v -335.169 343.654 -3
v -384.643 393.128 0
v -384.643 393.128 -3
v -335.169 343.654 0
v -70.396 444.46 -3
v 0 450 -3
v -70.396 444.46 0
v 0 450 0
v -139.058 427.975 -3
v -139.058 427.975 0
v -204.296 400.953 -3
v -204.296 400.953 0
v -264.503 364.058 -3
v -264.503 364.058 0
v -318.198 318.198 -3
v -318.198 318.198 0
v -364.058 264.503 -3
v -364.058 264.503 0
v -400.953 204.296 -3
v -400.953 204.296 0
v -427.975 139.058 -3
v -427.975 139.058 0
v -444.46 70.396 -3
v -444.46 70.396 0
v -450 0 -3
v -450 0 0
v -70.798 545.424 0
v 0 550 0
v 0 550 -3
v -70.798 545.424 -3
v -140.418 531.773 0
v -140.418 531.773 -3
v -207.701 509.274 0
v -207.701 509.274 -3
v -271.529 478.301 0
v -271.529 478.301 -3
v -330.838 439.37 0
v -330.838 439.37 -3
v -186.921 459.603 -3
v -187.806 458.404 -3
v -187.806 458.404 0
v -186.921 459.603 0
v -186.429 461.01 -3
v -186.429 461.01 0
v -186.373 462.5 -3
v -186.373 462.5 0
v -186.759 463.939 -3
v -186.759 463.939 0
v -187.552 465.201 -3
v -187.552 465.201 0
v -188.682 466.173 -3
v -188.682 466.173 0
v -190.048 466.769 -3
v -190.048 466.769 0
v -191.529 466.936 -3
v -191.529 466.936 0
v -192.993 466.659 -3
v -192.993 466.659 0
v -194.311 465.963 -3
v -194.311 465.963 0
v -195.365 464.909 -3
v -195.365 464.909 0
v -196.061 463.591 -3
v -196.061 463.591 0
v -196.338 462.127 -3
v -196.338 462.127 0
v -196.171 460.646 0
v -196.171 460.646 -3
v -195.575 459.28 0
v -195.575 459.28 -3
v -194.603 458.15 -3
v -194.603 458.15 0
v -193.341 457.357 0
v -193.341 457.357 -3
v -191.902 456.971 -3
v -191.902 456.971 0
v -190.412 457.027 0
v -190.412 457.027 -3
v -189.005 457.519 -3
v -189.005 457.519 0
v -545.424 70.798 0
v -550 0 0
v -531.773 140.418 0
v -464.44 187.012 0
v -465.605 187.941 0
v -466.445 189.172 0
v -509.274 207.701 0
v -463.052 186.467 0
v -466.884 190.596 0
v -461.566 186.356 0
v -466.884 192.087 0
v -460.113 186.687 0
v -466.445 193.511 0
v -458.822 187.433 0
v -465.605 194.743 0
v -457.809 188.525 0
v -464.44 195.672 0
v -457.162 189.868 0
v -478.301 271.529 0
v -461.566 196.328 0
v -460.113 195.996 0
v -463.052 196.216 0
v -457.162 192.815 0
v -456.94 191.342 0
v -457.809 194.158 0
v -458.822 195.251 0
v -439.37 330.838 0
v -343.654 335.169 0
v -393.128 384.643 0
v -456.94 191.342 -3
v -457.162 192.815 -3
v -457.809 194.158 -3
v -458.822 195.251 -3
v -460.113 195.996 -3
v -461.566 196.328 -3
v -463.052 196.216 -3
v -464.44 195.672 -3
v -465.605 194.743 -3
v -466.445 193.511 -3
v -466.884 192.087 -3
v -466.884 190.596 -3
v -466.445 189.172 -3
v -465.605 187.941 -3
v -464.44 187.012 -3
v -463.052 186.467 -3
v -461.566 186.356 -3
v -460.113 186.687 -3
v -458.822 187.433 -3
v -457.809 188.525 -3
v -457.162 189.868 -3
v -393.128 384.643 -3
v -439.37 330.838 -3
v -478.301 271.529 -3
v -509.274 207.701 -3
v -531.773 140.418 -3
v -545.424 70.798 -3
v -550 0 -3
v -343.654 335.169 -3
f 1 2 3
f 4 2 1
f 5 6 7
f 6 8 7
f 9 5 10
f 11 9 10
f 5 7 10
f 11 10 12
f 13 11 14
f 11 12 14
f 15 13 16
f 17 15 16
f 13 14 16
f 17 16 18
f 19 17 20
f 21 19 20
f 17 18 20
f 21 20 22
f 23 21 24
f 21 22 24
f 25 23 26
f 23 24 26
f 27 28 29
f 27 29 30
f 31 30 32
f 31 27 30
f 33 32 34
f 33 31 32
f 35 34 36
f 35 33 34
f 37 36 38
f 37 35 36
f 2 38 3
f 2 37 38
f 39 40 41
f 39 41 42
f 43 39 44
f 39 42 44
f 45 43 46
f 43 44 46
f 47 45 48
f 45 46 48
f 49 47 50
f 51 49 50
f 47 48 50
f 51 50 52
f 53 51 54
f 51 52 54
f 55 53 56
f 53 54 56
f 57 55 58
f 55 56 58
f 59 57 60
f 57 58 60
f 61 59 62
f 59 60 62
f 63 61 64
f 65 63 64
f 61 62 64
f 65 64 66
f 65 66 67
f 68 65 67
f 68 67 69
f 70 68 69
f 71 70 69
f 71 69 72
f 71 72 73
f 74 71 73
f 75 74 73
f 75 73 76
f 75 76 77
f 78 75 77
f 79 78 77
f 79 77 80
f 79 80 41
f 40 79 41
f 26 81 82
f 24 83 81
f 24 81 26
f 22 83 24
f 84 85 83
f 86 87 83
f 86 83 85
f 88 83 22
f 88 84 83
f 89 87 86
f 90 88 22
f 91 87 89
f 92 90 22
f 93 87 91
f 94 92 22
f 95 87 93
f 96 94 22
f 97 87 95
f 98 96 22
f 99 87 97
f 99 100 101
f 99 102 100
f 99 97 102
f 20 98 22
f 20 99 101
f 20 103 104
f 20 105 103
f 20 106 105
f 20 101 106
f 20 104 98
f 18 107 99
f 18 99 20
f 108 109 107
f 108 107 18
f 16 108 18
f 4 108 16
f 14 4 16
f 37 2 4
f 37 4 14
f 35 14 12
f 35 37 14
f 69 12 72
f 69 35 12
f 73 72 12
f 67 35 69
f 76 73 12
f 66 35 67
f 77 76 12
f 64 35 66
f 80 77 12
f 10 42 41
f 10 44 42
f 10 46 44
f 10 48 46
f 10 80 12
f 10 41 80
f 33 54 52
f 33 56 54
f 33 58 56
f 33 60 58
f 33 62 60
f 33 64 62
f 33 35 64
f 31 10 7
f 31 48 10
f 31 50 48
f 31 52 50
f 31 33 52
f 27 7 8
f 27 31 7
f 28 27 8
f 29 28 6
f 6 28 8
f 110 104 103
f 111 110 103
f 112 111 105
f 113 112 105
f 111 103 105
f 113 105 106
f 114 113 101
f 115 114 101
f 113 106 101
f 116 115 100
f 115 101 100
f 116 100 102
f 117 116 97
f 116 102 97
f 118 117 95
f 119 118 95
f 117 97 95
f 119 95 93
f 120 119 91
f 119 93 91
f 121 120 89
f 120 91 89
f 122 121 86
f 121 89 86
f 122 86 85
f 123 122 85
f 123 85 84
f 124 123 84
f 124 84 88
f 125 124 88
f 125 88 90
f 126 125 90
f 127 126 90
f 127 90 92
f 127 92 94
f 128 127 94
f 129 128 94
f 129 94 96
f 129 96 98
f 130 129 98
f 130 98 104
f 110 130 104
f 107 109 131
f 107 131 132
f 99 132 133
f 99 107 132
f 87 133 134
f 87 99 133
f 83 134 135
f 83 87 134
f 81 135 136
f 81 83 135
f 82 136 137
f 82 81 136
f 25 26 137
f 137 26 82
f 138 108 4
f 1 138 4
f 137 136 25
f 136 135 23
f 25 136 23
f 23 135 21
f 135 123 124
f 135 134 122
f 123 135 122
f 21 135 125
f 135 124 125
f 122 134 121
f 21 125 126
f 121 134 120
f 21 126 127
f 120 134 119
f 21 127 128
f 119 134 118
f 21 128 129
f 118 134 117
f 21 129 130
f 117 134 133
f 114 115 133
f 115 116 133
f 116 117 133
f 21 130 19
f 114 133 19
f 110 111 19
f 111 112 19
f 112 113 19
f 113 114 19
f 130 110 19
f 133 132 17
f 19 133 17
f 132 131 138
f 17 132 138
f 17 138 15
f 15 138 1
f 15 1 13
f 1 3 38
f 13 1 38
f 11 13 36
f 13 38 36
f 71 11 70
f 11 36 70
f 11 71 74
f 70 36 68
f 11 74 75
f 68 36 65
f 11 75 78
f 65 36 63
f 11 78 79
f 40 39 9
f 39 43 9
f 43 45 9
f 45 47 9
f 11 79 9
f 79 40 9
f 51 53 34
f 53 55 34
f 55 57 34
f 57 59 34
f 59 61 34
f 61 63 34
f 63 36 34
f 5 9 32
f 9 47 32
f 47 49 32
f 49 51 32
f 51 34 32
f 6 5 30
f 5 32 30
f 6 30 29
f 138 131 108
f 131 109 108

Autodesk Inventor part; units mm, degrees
ref_plane "YZ Plane" through (0, 0, 0) normal (1, 0, 0) x (0, 1, 0)
ref_plane "XZ Plane" through (0, 0, 0) normal (0, 1, 0) x (-1, 0, 0)
ref_plane "XY Plane" through (0, 0, 0) normal (0, 0, 1) x (1, 0, 0)
sketch "Sketch1" plane through (0, 0, 0) normal (0, 0, 1) x (1, 0, 0)
  arc A0 (0, 550) -> (-550, 0) centre (0, 0) ccw
  arc A1 (0, 450) -> (-450, 0) centre (0, 0) ccw
  line L0 (0, 550) -> (0, 450)
  line L1 (-450, 0) -> (-550, 0)
  point P0 (-500, 0)
  point P1 (0, 500)
  dimension "d0" = 1100
  dimension "d1" = 900
extrude "Plate1" add sketch "Sketch1" against normal blind 3
sketch "Sketch2" plane through (0, 0, 0) normal (0, 0, 1) x (1, 0, 0)
  line L0 (-550, 0) -> (-450, 0) projected
  arc A0 (0, 550) -> (-550, 0) centre (0, 0) ccw projected
  circle A1 centre (-461.9398, 191.3417) radius 5
  arc A2 (0, 450) -> (-450, 0) centre (0, 0) ccw projected
  line L1 (-415.7458, 172.2075) -> (-508.1337, 210.4759) construction
  point P0 (-461.9398, 191.3417)
  dimension "d4" = 10
  dimension "d5" = 22.5
extrude "Cut1" cut sketch "Sketch2" against normal through all
pattern_circular "Circular Pattern1" count 2 over 45 about axis through (0, 0, 0) along (0, 0, -1) of "Cut1"
sketch "Sketch3" plane through (0, 0, 0) normal (0, 0, 1) x (1, 0, 0)
  line L0 (-388.9087, 388.9087) -> (-318.1981, 318.1981) construction
  arc A0 (0, 450) -> (-450, 0) centre (0, 0) ccw projected
  arc A1 (0, 550) -> (-550, 0) centre (0, 0) ccw projected
  line L1 (-550, 0) -> (-450, 0) projected
  line L2 (-384.6661, 393.1514) -> (-393.1514, 384.6661)
  line L3 (-384.6661, 393.1514) -> (-335.1686, 343.6539)
  line L4 (-393.1514, 384.6661) -> (-343.6539, 335.1686)
  line L5 (-343.6539, 335.1686) -> (-335.1686, 343.6539)
  point P0 (-388.9087, 388.9087)
  dimension "d11" = 45
  dimension "d12" = 12
  dimension "d13" = 70
extrude "Extrusion1" cut sketch "Sketch3" against normal through all
equation "\"d0\" = Диаметр_вн"
equation "\"d1\" = d0 - 2 * Ширина_кольца"
equation "\"d4\" = Диаметр_отв"
equation "\"d6\" = Thickness"
equation "\"d2\" = Thickness"
equation "\"BendReliefWidth\" = Thickness"
equation "\"BendReliefDepth\" = 0.5 * Thickness"
equation "\"CornerReliefSize\" = 4 * Thickness"
equation "\"MinimumRemnant\" = 2 * Thickness"
equation "\"TransitionRadius\" = BendRadius"
equation "\"JacobiRadiusSize\" = BendRadius"
equation "\"GapSize\" = Thickness"
equation "\"Диаметр_вн\" = 1100"
equation "\"Ширина_кольца\" = 100"
equation "\"Диаметр_отв\" = 10"
equation "\"Thickness\" = 3"
equation "\"BendRadius\" = 5"
properties part number "BSH 502 segment" material "Stainless Steel"
